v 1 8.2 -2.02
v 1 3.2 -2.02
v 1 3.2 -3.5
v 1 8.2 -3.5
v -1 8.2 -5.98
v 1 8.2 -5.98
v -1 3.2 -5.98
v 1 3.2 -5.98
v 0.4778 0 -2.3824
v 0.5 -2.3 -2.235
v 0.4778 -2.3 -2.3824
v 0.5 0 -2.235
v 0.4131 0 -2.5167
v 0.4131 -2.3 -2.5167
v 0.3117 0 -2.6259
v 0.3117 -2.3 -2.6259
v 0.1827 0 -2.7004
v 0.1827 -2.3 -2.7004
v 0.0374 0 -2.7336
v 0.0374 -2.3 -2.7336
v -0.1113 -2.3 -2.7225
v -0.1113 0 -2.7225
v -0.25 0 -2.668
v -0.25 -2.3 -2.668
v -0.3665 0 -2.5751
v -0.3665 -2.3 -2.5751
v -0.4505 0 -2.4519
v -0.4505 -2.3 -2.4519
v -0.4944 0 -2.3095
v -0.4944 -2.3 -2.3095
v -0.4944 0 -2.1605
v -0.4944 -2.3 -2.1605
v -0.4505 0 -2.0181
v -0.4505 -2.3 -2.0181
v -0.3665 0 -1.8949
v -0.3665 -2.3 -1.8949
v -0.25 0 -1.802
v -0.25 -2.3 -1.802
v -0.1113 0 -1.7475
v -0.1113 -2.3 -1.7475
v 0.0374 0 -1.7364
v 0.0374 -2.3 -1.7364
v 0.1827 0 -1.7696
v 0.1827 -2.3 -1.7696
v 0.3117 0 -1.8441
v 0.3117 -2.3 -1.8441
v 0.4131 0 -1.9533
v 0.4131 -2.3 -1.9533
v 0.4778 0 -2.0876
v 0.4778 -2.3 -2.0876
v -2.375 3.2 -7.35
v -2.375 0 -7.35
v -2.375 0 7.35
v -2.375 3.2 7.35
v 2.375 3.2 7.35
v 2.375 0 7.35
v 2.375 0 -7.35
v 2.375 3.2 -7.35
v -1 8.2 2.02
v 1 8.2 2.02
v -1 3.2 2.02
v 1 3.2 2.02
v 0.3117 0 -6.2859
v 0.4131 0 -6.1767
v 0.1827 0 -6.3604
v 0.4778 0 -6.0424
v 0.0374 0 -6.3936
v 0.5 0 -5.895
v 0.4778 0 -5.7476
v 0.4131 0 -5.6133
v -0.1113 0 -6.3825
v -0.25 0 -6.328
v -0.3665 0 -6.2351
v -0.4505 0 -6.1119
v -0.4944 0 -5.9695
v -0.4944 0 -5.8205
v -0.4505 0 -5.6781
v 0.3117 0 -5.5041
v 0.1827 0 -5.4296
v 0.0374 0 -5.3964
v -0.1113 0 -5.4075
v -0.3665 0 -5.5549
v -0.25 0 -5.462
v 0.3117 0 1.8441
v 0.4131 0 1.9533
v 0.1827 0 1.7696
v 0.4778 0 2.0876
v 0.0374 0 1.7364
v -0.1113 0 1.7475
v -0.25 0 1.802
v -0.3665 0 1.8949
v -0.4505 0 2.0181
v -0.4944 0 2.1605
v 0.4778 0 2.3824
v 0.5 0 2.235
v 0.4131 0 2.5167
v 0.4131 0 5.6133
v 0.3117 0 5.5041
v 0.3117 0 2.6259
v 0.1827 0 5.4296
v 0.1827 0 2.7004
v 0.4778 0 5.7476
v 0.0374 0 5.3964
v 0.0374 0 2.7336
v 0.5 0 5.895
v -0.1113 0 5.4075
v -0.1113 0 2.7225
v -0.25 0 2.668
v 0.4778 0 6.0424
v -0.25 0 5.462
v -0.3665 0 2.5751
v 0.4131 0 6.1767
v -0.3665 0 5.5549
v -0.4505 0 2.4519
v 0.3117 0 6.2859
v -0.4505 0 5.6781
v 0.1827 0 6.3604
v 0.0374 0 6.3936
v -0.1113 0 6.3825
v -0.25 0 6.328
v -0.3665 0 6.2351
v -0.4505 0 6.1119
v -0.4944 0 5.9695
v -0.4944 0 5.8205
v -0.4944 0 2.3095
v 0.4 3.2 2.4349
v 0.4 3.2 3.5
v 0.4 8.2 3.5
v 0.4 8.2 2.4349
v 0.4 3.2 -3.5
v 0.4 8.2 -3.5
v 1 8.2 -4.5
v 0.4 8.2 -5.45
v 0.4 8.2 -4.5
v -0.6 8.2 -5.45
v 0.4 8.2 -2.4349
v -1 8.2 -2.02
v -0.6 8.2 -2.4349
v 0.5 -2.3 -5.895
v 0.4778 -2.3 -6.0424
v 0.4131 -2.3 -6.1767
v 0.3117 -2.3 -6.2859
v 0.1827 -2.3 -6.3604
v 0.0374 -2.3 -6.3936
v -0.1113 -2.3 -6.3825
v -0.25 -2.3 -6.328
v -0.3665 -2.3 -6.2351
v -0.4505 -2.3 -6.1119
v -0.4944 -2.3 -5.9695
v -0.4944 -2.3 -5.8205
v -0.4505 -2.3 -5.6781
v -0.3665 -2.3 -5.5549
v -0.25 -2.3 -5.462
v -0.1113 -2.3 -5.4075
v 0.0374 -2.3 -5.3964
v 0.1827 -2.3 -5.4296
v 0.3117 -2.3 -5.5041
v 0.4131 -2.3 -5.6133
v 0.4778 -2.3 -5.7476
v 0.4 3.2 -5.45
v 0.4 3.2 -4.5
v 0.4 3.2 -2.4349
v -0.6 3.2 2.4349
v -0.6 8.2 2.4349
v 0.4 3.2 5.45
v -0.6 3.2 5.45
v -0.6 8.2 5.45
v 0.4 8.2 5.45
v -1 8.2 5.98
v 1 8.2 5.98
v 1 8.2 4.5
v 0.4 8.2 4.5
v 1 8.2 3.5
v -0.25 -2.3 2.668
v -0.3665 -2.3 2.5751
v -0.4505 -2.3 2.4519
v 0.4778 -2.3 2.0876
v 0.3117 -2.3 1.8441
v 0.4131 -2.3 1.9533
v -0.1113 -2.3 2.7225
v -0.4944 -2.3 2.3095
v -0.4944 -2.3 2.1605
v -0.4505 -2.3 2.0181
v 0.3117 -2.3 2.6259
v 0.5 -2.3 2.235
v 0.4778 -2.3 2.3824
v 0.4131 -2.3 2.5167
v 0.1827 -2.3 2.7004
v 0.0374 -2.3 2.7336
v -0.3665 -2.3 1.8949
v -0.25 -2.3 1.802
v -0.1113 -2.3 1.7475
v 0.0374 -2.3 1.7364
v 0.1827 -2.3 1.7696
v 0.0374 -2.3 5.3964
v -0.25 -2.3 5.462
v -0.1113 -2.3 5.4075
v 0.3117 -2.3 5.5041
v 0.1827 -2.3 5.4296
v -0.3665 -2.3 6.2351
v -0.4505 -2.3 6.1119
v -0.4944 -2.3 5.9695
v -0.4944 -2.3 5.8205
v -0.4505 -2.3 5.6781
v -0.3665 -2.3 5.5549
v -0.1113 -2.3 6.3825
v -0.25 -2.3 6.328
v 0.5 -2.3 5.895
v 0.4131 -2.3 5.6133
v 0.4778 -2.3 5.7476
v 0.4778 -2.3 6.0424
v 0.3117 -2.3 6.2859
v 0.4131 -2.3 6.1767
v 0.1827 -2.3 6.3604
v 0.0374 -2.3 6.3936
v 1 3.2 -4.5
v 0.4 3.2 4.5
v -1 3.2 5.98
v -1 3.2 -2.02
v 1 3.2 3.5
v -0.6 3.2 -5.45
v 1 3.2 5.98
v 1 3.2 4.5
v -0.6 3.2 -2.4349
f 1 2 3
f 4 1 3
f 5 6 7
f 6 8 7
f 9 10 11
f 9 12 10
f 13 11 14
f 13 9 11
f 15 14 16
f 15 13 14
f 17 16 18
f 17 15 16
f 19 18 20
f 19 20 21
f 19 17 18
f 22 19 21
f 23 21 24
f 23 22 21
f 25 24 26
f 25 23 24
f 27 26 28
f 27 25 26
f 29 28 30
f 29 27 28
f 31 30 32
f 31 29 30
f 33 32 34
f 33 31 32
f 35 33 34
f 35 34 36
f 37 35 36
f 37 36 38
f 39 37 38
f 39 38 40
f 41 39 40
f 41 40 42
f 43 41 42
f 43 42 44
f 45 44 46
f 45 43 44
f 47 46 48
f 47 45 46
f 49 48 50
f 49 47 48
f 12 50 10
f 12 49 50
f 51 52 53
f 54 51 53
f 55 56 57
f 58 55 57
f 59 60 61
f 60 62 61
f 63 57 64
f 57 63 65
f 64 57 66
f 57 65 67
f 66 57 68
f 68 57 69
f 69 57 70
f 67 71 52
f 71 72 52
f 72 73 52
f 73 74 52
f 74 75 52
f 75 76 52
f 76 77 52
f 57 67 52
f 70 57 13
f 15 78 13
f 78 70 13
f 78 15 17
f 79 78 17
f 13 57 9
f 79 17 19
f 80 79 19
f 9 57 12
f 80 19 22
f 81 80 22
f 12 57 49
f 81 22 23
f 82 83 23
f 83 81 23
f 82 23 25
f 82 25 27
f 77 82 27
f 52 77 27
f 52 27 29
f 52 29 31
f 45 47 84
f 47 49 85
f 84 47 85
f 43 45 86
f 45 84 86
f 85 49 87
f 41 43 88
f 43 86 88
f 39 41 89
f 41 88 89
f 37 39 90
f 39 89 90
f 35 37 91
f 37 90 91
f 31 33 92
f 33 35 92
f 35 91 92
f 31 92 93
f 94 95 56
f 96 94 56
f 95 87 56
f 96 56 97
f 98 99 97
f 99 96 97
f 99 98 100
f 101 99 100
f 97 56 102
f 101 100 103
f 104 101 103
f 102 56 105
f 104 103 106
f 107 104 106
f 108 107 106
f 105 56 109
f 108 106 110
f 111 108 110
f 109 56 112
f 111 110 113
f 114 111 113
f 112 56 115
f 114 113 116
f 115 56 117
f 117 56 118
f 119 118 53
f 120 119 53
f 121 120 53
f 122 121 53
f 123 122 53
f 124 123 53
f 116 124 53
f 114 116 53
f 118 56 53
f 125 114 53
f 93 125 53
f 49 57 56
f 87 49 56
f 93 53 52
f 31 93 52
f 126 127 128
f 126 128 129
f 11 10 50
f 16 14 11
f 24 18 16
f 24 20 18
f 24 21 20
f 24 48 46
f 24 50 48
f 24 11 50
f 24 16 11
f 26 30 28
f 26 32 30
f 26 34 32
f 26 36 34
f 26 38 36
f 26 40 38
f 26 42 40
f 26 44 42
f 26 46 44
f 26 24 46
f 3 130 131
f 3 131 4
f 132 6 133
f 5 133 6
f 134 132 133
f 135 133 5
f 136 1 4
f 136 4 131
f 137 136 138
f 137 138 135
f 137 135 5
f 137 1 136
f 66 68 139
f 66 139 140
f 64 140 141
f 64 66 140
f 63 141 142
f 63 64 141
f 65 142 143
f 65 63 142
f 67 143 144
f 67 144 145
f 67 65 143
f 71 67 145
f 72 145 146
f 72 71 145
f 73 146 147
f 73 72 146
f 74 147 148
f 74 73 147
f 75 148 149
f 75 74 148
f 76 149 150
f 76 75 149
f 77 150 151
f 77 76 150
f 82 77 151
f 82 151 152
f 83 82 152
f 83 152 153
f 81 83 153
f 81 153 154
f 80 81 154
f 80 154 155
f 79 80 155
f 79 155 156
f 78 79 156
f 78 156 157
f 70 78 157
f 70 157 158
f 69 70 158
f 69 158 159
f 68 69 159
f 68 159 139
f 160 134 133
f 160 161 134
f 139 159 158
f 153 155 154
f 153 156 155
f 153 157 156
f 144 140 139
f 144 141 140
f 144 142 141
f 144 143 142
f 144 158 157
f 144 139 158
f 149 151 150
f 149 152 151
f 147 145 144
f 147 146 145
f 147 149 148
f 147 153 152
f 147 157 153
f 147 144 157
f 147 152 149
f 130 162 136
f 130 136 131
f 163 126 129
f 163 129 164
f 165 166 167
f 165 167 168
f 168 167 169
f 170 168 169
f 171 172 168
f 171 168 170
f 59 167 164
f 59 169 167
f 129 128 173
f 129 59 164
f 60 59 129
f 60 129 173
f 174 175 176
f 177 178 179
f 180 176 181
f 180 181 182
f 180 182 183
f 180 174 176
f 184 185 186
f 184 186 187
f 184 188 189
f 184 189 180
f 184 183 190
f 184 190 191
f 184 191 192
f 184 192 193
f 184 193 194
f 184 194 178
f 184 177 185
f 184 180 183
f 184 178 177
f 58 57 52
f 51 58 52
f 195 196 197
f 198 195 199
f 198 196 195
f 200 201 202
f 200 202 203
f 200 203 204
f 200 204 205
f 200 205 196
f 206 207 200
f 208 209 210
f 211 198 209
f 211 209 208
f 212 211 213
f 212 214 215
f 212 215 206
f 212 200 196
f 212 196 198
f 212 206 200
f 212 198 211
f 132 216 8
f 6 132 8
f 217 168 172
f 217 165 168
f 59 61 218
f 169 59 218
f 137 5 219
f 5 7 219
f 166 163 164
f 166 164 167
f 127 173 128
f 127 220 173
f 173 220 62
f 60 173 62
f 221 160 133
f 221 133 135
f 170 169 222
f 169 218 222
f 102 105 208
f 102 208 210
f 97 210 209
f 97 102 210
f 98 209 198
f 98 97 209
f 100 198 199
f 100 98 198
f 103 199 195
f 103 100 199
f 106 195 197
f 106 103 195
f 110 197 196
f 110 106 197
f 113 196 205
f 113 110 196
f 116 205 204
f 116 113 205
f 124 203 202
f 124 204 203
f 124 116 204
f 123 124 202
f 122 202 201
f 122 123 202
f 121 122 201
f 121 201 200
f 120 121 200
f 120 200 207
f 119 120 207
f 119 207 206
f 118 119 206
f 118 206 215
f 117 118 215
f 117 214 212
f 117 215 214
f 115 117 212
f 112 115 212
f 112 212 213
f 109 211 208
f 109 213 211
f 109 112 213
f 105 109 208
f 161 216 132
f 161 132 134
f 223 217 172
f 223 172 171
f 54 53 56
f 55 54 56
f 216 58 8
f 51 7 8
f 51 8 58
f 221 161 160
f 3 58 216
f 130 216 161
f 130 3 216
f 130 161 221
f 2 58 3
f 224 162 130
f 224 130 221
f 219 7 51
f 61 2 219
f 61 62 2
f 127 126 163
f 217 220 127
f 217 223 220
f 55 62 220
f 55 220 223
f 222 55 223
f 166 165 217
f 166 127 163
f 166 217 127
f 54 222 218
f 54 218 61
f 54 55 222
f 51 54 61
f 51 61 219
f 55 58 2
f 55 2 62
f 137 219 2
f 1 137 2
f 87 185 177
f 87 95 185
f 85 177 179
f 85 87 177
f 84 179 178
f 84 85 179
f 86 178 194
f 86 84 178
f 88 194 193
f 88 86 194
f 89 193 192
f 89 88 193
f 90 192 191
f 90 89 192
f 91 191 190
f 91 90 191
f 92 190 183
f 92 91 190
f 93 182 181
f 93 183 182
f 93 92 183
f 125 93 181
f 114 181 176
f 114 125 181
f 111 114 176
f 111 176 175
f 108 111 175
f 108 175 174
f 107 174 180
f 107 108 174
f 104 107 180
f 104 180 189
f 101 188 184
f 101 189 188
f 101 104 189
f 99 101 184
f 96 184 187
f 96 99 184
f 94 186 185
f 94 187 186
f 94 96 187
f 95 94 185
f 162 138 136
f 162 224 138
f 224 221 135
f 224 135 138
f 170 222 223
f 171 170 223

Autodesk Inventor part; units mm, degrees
ref_plane "YZ Plane" through (0, 0, 0) normal (1, 0, 0) x (0, 1, 0)
ref_plane "XZ Plane" through (0, 0, 0) normal (0, 1, 0) x (-1, 0, 0)
ref_plane "XY Plane" through (0, 0, 0) normal (0, 0, 1) x (1, 0, 0)
sketch "Sketch1" plane through (0, 0, 0) normal (0, 1, 0) x (-1, 0, 0)
  line L0 (2.375, 7.35) -> (-2.375, 7.35)
  line L1 (-2.375, 7.35) -> (-2.375, -7.35)
  line L2 (-2.375, -7.35) -> (2.375, -7.35)
  line L3 (2.375, -7.35) -> (2.375, 7.35)
  point P0 (0, 0)
  dimension "d0" = 14.7
  dimension "d1" = 4.75
  dimension "d2" = 2.375
  dimension "d3" = 7.35
extrude "Extrusion1" add sketch "Sketch1" along normal blind 3.2
sketch "Sketch2" plane through (0, 0, 0) normal (0, -1, 0) x (1, 0, 0)
  circle A0 centre (0, 5.895) radius 0.5
  circle A1 centre (0, 2.235) radius 0.5
  point P0 (0, 0)
  dimension "d6" = 3.66
  dimension "d7" = 2.235
  dimension "d8" = 1
  dimension "d9" = 1
extrude "Extrusion2" add sketch "Sketch2" along normal blind 2.3
sketch "Sketch3" plane through (0, 3.2, 0) normal (0, 1, 0) x (1, 0, 0)
  line L0 (-1, -5.98) -> (1, -5.98)
  line L1 (1, -5.98) -> (1, -2.02)
  line L2 (1, -2.02) -> (-1, -2.02)
  line L3 (-1, -2.02) -> (-1, -5.98)
  line L4 (-1, -4) -> (1, -4) construction
  line L5 (-0.6, -5.45) -> (0.4, -5.45)
  line L6 (0.4, -5.45) -> (0.4, -2.4349)
  line L7 (0.4, -2.4349) -> (-0.6, -2.4349)
  line L8 (-0.6, -2.4349) -> (-0.6, -5.45)
  line L9 (0.4, -4.5) -> (1, -4.5)
  line L10 (1, -4.5) -> (1, -3.5)
  line L11 (1, -3.5) -> (0.4, -3.5)
  line L12 (0.4, -3.5) -> (0.4, -4.5)
  point P0 (0, 0)
  dimension "d12" = 4
  dimension "d13" = 3.96
  dimension "d14" = 1
  dimension "d15" = 0.4
  dimension "d16" = 5.45
  dimension "d17" = 3.0151
  dimension "d18" = 2
  dimension "d19" = 1
  dimension "d20" = 0.5
  dimension "d21" = 1
extrude "Extrusion3" add sketch "Sketch3" along normal blind 5 contours L3 L2 L1 L11 L6 L7 L8 L5 L9 L0
mirror "Mirror1" about plane through (0, 0, 0) normal (0, 0, 1) of "Extrusion3", "Extrusion2"
properties part number "BK-6013_MiniATC_Fuse_Holder"
